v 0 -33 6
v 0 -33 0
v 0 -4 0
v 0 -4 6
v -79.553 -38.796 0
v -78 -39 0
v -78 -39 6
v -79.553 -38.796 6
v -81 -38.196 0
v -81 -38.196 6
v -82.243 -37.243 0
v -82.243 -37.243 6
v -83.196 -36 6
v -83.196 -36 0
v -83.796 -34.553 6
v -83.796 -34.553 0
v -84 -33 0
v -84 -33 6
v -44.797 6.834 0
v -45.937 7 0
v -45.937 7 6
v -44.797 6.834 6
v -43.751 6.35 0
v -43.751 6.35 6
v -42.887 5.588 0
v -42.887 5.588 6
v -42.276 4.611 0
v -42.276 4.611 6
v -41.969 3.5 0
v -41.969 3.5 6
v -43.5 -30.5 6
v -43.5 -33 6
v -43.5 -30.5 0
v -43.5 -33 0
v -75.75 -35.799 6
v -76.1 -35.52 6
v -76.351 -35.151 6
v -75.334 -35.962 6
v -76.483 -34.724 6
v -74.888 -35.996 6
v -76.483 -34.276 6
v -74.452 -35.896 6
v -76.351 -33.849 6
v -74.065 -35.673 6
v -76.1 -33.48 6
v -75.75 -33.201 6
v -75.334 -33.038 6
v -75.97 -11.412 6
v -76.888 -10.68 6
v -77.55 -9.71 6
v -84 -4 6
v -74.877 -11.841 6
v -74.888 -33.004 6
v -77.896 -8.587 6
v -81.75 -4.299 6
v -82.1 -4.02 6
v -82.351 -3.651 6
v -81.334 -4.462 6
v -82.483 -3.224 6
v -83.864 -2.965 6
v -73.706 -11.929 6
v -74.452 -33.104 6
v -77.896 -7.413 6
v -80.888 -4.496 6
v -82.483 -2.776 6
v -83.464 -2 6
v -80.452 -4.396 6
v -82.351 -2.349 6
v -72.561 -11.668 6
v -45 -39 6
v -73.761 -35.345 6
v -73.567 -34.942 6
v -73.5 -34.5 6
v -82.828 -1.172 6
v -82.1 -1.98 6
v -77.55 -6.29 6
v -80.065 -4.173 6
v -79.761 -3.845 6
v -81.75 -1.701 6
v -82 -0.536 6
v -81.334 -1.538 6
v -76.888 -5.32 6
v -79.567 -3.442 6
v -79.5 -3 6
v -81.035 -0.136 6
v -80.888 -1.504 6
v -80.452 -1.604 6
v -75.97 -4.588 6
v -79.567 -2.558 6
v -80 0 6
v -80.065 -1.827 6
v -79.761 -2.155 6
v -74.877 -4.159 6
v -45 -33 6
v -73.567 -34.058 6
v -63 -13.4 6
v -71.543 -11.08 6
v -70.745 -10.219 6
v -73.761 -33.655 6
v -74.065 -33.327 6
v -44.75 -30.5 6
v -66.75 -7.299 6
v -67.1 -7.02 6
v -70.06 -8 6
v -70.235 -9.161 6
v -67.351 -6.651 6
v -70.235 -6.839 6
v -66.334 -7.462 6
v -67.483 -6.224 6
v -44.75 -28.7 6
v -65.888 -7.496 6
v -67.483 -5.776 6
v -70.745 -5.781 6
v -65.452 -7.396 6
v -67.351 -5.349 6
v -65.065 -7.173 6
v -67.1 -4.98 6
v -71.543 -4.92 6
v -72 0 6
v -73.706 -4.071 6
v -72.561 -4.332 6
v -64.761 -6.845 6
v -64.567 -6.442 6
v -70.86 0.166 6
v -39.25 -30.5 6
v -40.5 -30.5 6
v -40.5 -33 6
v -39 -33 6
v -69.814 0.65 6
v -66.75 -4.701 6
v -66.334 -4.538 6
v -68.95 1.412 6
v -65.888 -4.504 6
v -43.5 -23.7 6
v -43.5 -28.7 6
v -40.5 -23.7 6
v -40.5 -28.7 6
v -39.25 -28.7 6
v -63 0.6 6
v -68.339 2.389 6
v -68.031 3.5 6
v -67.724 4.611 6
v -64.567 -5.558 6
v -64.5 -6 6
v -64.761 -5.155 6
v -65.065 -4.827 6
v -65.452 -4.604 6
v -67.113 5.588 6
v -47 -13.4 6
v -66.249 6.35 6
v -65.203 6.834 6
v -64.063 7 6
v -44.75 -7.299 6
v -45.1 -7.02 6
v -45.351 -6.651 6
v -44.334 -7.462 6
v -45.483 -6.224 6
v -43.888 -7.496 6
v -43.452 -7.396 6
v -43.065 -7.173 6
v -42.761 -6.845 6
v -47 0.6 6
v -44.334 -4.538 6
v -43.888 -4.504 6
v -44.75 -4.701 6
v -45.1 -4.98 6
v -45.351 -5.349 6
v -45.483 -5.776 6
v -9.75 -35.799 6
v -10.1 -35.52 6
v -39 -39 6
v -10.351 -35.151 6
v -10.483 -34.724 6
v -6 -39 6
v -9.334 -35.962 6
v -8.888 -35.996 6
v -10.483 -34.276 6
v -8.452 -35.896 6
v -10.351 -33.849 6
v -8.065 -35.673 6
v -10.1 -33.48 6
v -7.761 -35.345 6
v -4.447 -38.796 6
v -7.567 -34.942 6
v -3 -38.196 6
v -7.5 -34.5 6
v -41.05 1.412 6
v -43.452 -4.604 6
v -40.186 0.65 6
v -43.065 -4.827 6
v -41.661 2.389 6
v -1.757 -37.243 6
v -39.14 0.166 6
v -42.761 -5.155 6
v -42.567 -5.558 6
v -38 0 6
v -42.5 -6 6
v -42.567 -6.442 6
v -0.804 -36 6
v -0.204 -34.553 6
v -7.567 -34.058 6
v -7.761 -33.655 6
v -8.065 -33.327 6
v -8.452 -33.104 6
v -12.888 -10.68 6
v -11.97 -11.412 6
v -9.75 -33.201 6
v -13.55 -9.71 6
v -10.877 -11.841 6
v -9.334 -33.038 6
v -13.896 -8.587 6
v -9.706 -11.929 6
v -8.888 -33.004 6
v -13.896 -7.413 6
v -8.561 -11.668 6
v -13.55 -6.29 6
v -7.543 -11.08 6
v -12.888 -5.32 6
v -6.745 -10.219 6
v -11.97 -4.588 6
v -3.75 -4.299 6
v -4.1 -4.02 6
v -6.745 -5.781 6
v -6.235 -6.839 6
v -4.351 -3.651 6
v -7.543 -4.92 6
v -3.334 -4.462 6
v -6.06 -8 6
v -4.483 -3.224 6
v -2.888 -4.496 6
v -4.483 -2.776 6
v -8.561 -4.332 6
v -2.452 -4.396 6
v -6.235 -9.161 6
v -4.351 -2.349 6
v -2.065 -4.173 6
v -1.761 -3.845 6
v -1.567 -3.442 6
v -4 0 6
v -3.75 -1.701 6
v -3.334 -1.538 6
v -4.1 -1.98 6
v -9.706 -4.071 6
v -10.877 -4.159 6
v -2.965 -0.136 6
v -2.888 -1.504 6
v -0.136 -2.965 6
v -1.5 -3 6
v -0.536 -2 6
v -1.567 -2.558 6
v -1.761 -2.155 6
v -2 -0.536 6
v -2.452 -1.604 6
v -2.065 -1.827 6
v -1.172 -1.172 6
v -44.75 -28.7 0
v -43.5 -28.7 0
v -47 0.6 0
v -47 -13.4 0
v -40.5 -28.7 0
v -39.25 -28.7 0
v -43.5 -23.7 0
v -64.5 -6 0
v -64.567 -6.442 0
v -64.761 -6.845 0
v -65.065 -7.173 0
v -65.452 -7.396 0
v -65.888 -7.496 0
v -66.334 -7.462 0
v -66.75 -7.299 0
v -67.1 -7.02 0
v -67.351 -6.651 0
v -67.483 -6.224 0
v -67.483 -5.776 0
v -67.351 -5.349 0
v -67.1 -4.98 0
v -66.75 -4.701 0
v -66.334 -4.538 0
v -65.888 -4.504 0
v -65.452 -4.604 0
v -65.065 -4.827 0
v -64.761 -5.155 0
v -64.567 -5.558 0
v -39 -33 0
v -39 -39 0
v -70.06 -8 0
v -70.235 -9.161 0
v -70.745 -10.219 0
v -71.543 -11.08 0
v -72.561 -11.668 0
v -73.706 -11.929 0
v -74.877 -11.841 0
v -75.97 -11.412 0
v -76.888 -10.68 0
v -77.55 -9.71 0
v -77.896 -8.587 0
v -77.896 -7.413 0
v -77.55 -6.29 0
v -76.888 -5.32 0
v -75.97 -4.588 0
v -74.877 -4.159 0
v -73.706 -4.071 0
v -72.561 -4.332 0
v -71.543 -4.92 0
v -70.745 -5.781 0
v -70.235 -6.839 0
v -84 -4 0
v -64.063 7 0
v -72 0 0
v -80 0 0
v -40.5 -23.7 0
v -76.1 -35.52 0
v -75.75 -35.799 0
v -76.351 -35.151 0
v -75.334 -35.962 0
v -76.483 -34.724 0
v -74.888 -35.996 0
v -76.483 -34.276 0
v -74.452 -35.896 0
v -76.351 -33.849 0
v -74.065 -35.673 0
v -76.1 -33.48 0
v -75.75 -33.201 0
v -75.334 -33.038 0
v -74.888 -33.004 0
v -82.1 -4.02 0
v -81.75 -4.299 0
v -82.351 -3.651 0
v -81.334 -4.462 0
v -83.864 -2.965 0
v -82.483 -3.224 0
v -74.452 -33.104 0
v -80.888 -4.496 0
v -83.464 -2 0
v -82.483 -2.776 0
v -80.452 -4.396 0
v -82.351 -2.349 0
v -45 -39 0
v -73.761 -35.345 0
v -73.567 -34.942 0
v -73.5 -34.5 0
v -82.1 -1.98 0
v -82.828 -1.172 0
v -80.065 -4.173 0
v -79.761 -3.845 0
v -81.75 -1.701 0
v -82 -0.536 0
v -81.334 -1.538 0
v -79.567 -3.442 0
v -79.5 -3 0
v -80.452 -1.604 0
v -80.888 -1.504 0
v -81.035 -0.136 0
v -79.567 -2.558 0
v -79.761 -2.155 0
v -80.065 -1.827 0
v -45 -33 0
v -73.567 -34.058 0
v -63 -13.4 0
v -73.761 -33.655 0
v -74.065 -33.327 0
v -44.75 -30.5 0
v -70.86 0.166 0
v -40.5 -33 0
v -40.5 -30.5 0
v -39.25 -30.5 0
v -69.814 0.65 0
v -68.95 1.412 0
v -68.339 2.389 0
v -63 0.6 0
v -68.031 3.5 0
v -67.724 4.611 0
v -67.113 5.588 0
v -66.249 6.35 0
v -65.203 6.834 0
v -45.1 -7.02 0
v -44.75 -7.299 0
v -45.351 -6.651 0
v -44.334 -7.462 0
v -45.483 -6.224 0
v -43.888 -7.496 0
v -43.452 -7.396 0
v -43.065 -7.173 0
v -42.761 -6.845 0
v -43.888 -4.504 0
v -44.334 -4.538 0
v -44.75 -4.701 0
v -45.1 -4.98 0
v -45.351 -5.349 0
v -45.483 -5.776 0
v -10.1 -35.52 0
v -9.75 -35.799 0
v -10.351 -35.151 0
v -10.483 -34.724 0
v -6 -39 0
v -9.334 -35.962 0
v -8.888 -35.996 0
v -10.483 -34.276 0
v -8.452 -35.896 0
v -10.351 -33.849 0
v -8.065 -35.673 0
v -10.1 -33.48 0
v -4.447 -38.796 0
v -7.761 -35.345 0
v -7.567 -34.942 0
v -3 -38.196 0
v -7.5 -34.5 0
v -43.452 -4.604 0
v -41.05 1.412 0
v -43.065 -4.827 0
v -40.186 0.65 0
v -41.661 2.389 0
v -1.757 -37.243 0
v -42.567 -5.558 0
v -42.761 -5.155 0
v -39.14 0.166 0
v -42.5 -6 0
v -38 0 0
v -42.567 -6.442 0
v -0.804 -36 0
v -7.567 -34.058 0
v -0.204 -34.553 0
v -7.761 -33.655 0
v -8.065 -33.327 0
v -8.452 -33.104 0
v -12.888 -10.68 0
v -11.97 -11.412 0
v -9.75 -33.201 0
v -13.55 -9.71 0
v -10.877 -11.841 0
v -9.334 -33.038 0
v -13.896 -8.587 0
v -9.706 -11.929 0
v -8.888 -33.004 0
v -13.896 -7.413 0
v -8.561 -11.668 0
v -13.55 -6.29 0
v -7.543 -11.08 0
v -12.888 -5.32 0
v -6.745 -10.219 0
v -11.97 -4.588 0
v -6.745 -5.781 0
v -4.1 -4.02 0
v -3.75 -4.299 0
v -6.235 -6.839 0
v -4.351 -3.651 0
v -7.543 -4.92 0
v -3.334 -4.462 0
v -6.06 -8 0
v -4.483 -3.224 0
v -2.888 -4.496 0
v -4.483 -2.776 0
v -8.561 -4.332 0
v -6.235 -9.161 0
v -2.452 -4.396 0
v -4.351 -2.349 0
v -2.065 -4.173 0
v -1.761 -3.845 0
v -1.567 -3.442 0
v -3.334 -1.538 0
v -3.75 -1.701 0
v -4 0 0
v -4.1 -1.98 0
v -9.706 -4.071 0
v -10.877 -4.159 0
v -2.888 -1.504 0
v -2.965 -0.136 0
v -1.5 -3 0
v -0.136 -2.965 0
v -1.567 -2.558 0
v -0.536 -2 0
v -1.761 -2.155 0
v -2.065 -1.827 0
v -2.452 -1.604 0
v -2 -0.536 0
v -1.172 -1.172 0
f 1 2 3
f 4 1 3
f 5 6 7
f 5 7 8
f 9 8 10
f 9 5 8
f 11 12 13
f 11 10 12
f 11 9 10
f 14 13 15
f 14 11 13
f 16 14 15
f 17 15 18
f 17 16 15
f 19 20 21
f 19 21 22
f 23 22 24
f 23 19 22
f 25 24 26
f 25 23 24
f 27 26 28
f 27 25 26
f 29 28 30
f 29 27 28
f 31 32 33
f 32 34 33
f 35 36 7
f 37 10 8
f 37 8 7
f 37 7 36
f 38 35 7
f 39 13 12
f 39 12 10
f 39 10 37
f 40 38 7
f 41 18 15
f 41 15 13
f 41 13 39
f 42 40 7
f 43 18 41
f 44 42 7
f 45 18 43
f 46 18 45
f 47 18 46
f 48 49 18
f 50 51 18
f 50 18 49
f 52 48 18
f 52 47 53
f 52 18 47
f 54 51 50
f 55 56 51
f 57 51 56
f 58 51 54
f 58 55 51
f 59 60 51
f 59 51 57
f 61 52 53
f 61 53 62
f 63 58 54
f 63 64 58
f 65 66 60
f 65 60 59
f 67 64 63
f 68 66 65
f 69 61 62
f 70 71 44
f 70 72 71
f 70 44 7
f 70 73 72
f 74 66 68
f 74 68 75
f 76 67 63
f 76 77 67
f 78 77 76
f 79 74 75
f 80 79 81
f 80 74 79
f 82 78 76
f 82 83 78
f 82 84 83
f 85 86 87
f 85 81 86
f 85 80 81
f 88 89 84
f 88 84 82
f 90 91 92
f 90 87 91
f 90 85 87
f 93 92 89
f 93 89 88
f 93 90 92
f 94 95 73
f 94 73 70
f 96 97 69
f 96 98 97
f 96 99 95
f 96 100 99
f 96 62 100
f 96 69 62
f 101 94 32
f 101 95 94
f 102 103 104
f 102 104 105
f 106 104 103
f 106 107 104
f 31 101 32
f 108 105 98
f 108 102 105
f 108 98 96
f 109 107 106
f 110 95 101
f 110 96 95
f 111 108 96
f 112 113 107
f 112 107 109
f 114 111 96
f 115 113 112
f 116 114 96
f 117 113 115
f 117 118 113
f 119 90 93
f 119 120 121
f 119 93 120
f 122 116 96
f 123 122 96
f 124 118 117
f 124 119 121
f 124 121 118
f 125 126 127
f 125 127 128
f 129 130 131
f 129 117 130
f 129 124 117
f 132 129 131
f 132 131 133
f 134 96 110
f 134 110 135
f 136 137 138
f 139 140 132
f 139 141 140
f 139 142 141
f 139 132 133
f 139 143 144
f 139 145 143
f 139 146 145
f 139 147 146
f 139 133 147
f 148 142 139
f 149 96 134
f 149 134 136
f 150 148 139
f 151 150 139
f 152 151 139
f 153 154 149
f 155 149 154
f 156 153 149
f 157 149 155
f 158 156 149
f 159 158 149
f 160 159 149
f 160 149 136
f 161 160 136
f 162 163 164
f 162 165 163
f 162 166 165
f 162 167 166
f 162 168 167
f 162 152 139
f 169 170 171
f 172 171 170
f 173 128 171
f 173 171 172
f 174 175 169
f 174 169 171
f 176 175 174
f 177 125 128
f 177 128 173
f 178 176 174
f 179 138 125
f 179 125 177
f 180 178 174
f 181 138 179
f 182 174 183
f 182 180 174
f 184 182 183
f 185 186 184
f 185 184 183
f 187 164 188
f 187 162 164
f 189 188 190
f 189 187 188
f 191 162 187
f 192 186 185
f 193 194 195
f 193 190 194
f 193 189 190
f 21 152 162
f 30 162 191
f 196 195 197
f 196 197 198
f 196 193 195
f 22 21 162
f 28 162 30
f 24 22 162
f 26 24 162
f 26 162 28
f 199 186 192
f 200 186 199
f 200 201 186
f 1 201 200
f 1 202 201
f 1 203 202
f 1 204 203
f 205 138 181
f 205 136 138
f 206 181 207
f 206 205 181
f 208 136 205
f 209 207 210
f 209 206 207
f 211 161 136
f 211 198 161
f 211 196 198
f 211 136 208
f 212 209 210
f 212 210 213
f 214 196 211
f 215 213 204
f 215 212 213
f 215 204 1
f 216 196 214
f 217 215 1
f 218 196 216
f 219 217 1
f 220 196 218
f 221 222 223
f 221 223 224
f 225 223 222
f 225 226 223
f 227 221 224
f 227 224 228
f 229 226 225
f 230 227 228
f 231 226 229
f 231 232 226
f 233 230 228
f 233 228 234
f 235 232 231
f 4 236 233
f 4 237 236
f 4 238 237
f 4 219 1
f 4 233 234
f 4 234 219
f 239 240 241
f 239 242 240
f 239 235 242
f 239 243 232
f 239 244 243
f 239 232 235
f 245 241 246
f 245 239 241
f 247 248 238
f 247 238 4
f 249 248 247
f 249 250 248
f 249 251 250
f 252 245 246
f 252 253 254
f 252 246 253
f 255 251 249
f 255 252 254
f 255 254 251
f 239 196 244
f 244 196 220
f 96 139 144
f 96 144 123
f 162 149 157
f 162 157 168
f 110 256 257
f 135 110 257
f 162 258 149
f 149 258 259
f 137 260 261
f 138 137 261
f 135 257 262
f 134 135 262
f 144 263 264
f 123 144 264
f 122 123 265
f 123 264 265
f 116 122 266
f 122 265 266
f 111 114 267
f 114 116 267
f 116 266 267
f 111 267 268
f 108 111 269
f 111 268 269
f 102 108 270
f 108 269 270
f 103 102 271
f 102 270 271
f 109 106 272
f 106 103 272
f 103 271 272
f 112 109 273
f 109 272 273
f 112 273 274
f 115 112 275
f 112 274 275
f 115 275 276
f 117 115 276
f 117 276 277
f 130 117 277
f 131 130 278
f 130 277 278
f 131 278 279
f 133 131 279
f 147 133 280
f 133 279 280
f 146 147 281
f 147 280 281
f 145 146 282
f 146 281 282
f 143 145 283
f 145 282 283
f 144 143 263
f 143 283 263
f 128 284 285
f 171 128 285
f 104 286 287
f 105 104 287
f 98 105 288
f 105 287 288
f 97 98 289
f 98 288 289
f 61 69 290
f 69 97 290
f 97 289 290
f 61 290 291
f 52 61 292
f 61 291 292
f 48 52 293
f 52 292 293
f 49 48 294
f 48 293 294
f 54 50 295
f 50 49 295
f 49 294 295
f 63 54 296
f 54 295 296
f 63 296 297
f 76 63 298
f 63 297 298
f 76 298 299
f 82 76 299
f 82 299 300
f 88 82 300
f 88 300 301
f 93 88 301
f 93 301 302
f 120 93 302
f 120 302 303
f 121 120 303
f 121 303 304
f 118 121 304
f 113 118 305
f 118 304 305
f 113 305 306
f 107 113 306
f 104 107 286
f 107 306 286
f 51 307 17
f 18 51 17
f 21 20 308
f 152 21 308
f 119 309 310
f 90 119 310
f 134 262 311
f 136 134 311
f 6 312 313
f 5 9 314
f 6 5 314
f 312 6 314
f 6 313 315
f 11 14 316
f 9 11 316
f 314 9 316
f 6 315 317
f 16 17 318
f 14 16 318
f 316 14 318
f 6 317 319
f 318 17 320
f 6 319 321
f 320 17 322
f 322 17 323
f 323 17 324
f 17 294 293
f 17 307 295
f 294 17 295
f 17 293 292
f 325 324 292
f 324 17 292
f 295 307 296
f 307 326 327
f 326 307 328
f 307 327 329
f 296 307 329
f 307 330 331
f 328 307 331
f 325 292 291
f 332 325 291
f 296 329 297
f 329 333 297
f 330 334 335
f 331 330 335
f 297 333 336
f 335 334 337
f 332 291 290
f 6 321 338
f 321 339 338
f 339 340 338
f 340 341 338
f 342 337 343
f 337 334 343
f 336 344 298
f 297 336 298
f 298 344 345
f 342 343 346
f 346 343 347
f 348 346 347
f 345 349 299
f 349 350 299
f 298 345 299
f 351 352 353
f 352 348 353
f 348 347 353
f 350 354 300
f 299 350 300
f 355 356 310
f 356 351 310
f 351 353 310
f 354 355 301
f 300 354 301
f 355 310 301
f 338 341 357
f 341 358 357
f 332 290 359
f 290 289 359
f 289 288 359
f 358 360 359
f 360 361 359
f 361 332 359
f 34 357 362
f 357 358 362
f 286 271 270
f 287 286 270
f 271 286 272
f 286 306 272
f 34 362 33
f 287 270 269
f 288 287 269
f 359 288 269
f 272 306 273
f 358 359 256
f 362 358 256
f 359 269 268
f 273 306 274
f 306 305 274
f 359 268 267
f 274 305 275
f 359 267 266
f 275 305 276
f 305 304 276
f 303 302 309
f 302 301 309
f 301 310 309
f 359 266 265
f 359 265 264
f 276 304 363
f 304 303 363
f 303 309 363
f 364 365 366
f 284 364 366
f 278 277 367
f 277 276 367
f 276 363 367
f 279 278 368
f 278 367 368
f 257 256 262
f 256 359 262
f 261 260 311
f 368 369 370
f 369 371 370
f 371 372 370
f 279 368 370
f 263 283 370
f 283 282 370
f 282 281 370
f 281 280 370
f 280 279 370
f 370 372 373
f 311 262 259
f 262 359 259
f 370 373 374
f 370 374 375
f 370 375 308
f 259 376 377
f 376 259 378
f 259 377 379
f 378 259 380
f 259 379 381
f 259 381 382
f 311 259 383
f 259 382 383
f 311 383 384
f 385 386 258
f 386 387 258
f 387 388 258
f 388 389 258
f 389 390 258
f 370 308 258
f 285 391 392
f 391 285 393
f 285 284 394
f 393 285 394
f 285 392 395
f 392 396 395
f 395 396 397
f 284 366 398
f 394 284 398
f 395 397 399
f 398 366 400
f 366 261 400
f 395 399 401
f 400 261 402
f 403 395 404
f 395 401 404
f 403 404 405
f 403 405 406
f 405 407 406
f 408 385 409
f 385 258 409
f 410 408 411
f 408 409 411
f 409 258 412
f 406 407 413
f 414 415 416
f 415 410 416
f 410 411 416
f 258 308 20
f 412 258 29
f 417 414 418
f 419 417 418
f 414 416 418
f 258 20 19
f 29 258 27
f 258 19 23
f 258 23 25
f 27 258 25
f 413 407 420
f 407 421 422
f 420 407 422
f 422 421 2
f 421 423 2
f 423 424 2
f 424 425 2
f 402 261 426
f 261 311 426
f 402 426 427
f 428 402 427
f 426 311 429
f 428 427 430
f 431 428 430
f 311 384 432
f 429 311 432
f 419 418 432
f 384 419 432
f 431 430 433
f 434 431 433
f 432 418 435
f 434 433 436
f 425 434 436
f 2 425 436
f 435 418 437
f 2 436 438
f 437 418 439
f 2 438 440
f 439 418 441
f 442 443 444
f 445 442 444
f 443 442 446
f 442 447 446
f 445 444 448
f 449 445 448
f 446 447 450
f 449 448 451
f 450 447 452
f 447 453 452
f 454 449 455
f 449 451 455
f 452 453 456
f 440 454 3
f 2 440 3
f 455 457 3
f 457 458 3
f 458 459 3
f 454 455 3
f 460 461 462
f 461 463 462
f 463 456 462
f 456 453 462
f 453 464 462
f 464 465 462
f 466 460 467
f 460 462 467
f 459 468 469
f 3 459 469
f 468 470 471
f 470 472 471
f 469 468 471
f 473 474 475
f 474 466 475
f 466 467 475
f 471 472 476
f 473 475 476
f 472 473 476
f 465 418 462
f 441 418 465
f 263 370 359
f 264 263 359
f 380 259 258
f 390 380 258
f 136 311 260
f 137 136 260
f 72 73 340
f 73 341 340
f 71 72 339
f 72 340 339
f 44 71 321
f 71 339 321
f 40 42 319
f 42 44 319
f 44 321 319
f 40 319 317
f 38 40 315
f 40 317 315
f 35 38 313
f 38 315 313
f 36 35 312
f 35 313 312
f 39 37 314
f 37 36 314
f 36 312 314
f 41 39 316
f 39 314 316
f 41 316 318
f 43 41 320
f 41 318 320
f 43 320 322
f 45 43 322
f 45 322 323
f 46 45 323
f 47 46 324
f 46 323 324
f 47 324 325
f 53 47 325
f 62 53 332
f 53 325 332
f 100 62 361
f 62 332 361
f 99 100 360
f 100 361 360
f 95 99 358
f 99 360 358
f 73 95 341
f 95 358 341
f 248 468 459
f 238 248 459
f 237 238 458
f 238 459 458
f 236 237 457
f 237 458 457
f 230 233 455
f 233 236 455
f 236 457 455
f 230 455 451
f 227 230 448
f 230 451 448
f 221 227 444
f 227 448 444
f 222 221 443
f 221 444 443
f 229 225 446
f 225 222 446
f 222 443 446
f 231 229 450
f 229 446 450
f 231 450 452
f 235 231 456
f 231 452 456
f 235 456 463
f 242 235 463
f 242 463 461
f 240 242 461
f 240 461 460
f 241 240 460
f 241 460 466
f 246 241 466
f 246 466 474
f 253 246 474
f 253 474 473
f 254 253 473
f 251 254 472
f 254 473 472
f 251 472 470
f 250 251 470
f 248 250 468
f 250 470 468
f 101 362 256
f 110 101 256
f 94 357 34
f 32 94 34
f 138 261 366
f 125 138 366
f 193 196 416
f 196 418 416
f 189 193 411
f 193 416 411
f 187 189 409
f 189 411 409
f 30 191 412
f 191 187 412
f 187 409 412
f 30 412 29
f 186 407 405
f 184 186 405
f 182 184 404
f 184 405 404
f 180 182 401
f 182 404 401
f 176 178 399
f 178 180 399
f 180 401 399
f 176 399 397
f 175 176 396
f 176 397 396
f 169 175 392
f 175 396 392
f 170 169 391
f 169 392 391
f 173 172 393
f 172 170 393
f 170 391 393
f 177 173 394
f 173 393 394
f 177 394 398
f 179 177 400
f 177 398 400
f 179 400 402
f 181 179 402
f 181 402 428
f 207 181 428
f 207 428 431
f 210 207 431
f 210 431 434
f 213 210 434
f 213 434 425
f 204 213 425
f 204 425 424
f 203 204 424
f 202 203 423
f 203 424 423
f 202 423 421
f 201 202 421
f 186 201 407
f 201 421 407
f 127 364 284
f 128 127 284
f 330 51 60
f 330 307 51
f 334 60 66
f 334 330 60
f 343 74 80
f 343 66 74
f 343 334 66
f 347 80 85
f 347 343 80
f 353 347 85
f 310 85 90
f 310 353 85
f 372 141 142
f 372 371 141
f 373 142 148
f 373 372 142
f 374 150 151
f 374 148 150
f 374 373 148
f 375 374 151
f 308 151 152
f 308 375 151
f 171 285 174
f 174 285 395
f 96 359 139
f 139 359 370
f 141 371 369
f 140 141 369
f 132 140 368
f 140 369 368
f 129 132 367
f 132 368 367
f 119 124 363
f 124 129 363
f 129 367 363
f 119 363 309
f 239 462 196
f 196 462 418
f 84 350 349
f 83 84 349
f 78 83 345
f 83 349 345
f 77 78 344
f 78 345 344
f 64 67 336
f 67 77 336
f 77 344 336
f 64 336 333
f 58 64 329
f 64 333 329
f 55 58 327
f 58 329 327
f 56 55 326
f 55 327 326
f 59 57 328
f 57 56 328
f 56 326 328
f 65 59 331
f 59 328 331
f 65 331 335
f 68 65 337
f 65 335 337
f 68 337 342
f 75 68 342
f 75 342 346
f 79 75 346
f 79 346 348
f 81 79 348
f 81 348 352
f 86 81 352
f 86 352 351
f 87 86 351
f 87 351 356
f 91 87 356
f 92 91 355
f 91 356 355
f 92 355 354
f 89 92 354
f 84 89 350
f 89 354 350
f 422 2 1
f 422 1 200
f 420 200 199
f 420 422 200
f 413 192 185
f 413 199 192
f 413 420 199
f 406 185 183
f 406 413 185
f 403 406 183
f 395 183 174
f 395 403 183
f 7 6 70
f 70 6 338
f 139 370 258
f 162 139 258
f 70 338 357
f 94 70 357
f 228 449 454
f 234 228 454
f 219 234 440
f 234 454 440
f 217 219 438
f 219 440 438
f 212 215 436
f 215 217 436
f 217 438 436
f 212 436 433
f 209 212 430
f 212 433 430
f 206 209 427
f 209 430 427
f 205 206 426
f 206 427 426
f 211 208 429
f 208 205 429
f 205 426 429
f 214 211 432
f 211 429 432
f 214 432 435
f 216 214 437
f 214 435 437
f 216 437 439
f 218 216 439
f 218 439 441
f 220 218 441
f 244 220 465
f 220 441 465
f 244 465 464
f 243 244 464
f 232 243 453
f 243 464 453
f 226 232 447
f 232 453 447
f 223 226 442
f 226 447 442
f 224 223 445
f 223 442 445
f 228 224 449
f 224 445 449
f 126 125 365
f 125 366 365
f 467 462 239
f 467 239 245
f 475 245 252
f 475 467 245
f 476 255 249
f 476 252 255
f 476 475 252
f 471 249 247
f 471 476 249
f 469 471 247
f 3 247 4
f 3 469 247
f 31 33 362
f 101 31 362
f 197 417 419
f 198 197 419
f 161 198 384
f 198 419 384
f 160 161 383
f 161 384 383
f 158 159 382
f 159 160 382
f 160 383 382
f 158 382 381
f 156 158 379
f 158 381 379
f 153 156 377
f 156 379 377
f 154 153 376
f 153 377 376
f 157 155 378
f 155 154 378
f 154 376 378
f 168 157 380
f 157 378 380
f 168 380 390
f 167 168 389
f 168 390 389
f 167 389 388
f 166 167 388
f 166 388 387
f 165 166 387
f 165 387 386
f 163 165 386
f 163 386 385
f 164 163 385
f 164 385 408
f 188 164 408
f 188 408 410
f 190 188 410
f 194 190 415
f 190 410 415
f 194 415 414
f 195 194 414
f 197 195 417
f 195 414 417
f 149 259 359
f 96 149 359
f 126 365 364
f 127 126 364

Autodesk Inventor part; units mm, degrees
ref_plane "YZ Plane" through (0, 0, 0) normal (1, 0, 0) x (0, 1, 0)
ref_plane "XZ Plane" through (0, 0, 0) normal (0, 1, 0) x (-1, 0, 0)
ref_plane "XY Plane" through (0, 0, 0) normal (0, 0, 1) x (1, 0, 0)
sketch "Sketch1" plane through (0, 0, 0) normal (0, 0, 1) x (1, 0, 0)
  arc A0 (-84, -33) -> (-78, -39) centre (-78, -33) ccw
  line L0 (-78, -39) -> (-45, -39)
  line L1 (-45, -39) -> (-45, -33)
  line L2 (-45, -33) -> (-43.5, -33)
  line L3 (-43.5, -33) -> (-43.5, -30.5)
  line L4 (-43.5, -30.5) -> (-44.75, -30.5)
  line L5 (-44.75, -30.5) -> (-44.75, -28.7)
  line L6 (-44.75, -28.7) -> (-43.5, -28.7)
  line L7 (-43.5, -28.7) -> (-43.5, -23.7)
  line L8 (-43.5, -23.7) -> (-40.5, -23.7)
  line L9 (-40.5, -23.7) -> (-40.5, -28.7)
  line L10 (-40.5, -28.7) -> (-39.25, -28.7)
  line L11 (-39.25, -28.7) -> (-39.25, -30.5)
  line L12 (-39.25, -30.5) -> (-40.5, -30.5)
  line L13 (-40.5, -30.5) -> (-40.5, -33)
  line L14 (-40.5, -33) -> (-39, -33)
  line L15 (-39, -33) -> (-39, -39)
  line L16 (-39, -39) -> (-6, -39)
  arc A1 (-6, -39) -> (0, -33) centre (-6, -33) ccw
  line L17 (0, -33) -> (0, -4)
  arc A2 (0, -4) -> (-4, 0) centre (-4, -4) ccw
  line L18 (-4, 0) -> (-38, 0)
  arc A3 (-41.9686, 3.5) -> (-38, 0) centre (-38, 4) ccw
  arc A4 (-41.9686, 3.5) -> (-45.9373, 7) centre (-45.9373, 3) ccw
  line L19 (-45.9373, 7) -> (-64.0627, 7)
  arc A5 (-64.0627, 7) -> (-68.0314, 3.5) centre (-64.0627, 3) ccw
  arc A6 (-72, 0) -> (-68.0314, 3.5) centre (-72, 4) ccw
  line L20 (-72, 0) -> (-80, 0)
  arc A7 (-80, 0) -> (-84, -4) centre (-80, -4) ccw
  line L21 (-84, -4) -> (-84, -33)
  line L22 (-63, 0.6) -> (-47, 0.6)
  line L23 (-47, 0.6) -> (-47, -13.4)
  line L24 (-47, -13.4) -> (-63, -13.4)
  line L25 (-63, -13.4) -> (-63, 0.6)
  circle A8 centre (-81, -3) radius 1.5
  circle A9 centre (-9, -34.5) radius 1.5
  circle A10 centre (-3, -3) radius 1.5
  circle A11 centre (-66, -6) radius 1.5
  circle A12 centre (-44, -6) radius 1.5
  circle A13 centre (-75, -34.5) radius 1.5
  circle A14 centre (-10, -8) radius 3.94
  circle A15 centre (-74, -8) radius 3.94
  point P0 (0, 0)
extrude "Extrusion1" add sketch "Sketch1" along normal blind 6
properties part number "XcrLeft_b"
